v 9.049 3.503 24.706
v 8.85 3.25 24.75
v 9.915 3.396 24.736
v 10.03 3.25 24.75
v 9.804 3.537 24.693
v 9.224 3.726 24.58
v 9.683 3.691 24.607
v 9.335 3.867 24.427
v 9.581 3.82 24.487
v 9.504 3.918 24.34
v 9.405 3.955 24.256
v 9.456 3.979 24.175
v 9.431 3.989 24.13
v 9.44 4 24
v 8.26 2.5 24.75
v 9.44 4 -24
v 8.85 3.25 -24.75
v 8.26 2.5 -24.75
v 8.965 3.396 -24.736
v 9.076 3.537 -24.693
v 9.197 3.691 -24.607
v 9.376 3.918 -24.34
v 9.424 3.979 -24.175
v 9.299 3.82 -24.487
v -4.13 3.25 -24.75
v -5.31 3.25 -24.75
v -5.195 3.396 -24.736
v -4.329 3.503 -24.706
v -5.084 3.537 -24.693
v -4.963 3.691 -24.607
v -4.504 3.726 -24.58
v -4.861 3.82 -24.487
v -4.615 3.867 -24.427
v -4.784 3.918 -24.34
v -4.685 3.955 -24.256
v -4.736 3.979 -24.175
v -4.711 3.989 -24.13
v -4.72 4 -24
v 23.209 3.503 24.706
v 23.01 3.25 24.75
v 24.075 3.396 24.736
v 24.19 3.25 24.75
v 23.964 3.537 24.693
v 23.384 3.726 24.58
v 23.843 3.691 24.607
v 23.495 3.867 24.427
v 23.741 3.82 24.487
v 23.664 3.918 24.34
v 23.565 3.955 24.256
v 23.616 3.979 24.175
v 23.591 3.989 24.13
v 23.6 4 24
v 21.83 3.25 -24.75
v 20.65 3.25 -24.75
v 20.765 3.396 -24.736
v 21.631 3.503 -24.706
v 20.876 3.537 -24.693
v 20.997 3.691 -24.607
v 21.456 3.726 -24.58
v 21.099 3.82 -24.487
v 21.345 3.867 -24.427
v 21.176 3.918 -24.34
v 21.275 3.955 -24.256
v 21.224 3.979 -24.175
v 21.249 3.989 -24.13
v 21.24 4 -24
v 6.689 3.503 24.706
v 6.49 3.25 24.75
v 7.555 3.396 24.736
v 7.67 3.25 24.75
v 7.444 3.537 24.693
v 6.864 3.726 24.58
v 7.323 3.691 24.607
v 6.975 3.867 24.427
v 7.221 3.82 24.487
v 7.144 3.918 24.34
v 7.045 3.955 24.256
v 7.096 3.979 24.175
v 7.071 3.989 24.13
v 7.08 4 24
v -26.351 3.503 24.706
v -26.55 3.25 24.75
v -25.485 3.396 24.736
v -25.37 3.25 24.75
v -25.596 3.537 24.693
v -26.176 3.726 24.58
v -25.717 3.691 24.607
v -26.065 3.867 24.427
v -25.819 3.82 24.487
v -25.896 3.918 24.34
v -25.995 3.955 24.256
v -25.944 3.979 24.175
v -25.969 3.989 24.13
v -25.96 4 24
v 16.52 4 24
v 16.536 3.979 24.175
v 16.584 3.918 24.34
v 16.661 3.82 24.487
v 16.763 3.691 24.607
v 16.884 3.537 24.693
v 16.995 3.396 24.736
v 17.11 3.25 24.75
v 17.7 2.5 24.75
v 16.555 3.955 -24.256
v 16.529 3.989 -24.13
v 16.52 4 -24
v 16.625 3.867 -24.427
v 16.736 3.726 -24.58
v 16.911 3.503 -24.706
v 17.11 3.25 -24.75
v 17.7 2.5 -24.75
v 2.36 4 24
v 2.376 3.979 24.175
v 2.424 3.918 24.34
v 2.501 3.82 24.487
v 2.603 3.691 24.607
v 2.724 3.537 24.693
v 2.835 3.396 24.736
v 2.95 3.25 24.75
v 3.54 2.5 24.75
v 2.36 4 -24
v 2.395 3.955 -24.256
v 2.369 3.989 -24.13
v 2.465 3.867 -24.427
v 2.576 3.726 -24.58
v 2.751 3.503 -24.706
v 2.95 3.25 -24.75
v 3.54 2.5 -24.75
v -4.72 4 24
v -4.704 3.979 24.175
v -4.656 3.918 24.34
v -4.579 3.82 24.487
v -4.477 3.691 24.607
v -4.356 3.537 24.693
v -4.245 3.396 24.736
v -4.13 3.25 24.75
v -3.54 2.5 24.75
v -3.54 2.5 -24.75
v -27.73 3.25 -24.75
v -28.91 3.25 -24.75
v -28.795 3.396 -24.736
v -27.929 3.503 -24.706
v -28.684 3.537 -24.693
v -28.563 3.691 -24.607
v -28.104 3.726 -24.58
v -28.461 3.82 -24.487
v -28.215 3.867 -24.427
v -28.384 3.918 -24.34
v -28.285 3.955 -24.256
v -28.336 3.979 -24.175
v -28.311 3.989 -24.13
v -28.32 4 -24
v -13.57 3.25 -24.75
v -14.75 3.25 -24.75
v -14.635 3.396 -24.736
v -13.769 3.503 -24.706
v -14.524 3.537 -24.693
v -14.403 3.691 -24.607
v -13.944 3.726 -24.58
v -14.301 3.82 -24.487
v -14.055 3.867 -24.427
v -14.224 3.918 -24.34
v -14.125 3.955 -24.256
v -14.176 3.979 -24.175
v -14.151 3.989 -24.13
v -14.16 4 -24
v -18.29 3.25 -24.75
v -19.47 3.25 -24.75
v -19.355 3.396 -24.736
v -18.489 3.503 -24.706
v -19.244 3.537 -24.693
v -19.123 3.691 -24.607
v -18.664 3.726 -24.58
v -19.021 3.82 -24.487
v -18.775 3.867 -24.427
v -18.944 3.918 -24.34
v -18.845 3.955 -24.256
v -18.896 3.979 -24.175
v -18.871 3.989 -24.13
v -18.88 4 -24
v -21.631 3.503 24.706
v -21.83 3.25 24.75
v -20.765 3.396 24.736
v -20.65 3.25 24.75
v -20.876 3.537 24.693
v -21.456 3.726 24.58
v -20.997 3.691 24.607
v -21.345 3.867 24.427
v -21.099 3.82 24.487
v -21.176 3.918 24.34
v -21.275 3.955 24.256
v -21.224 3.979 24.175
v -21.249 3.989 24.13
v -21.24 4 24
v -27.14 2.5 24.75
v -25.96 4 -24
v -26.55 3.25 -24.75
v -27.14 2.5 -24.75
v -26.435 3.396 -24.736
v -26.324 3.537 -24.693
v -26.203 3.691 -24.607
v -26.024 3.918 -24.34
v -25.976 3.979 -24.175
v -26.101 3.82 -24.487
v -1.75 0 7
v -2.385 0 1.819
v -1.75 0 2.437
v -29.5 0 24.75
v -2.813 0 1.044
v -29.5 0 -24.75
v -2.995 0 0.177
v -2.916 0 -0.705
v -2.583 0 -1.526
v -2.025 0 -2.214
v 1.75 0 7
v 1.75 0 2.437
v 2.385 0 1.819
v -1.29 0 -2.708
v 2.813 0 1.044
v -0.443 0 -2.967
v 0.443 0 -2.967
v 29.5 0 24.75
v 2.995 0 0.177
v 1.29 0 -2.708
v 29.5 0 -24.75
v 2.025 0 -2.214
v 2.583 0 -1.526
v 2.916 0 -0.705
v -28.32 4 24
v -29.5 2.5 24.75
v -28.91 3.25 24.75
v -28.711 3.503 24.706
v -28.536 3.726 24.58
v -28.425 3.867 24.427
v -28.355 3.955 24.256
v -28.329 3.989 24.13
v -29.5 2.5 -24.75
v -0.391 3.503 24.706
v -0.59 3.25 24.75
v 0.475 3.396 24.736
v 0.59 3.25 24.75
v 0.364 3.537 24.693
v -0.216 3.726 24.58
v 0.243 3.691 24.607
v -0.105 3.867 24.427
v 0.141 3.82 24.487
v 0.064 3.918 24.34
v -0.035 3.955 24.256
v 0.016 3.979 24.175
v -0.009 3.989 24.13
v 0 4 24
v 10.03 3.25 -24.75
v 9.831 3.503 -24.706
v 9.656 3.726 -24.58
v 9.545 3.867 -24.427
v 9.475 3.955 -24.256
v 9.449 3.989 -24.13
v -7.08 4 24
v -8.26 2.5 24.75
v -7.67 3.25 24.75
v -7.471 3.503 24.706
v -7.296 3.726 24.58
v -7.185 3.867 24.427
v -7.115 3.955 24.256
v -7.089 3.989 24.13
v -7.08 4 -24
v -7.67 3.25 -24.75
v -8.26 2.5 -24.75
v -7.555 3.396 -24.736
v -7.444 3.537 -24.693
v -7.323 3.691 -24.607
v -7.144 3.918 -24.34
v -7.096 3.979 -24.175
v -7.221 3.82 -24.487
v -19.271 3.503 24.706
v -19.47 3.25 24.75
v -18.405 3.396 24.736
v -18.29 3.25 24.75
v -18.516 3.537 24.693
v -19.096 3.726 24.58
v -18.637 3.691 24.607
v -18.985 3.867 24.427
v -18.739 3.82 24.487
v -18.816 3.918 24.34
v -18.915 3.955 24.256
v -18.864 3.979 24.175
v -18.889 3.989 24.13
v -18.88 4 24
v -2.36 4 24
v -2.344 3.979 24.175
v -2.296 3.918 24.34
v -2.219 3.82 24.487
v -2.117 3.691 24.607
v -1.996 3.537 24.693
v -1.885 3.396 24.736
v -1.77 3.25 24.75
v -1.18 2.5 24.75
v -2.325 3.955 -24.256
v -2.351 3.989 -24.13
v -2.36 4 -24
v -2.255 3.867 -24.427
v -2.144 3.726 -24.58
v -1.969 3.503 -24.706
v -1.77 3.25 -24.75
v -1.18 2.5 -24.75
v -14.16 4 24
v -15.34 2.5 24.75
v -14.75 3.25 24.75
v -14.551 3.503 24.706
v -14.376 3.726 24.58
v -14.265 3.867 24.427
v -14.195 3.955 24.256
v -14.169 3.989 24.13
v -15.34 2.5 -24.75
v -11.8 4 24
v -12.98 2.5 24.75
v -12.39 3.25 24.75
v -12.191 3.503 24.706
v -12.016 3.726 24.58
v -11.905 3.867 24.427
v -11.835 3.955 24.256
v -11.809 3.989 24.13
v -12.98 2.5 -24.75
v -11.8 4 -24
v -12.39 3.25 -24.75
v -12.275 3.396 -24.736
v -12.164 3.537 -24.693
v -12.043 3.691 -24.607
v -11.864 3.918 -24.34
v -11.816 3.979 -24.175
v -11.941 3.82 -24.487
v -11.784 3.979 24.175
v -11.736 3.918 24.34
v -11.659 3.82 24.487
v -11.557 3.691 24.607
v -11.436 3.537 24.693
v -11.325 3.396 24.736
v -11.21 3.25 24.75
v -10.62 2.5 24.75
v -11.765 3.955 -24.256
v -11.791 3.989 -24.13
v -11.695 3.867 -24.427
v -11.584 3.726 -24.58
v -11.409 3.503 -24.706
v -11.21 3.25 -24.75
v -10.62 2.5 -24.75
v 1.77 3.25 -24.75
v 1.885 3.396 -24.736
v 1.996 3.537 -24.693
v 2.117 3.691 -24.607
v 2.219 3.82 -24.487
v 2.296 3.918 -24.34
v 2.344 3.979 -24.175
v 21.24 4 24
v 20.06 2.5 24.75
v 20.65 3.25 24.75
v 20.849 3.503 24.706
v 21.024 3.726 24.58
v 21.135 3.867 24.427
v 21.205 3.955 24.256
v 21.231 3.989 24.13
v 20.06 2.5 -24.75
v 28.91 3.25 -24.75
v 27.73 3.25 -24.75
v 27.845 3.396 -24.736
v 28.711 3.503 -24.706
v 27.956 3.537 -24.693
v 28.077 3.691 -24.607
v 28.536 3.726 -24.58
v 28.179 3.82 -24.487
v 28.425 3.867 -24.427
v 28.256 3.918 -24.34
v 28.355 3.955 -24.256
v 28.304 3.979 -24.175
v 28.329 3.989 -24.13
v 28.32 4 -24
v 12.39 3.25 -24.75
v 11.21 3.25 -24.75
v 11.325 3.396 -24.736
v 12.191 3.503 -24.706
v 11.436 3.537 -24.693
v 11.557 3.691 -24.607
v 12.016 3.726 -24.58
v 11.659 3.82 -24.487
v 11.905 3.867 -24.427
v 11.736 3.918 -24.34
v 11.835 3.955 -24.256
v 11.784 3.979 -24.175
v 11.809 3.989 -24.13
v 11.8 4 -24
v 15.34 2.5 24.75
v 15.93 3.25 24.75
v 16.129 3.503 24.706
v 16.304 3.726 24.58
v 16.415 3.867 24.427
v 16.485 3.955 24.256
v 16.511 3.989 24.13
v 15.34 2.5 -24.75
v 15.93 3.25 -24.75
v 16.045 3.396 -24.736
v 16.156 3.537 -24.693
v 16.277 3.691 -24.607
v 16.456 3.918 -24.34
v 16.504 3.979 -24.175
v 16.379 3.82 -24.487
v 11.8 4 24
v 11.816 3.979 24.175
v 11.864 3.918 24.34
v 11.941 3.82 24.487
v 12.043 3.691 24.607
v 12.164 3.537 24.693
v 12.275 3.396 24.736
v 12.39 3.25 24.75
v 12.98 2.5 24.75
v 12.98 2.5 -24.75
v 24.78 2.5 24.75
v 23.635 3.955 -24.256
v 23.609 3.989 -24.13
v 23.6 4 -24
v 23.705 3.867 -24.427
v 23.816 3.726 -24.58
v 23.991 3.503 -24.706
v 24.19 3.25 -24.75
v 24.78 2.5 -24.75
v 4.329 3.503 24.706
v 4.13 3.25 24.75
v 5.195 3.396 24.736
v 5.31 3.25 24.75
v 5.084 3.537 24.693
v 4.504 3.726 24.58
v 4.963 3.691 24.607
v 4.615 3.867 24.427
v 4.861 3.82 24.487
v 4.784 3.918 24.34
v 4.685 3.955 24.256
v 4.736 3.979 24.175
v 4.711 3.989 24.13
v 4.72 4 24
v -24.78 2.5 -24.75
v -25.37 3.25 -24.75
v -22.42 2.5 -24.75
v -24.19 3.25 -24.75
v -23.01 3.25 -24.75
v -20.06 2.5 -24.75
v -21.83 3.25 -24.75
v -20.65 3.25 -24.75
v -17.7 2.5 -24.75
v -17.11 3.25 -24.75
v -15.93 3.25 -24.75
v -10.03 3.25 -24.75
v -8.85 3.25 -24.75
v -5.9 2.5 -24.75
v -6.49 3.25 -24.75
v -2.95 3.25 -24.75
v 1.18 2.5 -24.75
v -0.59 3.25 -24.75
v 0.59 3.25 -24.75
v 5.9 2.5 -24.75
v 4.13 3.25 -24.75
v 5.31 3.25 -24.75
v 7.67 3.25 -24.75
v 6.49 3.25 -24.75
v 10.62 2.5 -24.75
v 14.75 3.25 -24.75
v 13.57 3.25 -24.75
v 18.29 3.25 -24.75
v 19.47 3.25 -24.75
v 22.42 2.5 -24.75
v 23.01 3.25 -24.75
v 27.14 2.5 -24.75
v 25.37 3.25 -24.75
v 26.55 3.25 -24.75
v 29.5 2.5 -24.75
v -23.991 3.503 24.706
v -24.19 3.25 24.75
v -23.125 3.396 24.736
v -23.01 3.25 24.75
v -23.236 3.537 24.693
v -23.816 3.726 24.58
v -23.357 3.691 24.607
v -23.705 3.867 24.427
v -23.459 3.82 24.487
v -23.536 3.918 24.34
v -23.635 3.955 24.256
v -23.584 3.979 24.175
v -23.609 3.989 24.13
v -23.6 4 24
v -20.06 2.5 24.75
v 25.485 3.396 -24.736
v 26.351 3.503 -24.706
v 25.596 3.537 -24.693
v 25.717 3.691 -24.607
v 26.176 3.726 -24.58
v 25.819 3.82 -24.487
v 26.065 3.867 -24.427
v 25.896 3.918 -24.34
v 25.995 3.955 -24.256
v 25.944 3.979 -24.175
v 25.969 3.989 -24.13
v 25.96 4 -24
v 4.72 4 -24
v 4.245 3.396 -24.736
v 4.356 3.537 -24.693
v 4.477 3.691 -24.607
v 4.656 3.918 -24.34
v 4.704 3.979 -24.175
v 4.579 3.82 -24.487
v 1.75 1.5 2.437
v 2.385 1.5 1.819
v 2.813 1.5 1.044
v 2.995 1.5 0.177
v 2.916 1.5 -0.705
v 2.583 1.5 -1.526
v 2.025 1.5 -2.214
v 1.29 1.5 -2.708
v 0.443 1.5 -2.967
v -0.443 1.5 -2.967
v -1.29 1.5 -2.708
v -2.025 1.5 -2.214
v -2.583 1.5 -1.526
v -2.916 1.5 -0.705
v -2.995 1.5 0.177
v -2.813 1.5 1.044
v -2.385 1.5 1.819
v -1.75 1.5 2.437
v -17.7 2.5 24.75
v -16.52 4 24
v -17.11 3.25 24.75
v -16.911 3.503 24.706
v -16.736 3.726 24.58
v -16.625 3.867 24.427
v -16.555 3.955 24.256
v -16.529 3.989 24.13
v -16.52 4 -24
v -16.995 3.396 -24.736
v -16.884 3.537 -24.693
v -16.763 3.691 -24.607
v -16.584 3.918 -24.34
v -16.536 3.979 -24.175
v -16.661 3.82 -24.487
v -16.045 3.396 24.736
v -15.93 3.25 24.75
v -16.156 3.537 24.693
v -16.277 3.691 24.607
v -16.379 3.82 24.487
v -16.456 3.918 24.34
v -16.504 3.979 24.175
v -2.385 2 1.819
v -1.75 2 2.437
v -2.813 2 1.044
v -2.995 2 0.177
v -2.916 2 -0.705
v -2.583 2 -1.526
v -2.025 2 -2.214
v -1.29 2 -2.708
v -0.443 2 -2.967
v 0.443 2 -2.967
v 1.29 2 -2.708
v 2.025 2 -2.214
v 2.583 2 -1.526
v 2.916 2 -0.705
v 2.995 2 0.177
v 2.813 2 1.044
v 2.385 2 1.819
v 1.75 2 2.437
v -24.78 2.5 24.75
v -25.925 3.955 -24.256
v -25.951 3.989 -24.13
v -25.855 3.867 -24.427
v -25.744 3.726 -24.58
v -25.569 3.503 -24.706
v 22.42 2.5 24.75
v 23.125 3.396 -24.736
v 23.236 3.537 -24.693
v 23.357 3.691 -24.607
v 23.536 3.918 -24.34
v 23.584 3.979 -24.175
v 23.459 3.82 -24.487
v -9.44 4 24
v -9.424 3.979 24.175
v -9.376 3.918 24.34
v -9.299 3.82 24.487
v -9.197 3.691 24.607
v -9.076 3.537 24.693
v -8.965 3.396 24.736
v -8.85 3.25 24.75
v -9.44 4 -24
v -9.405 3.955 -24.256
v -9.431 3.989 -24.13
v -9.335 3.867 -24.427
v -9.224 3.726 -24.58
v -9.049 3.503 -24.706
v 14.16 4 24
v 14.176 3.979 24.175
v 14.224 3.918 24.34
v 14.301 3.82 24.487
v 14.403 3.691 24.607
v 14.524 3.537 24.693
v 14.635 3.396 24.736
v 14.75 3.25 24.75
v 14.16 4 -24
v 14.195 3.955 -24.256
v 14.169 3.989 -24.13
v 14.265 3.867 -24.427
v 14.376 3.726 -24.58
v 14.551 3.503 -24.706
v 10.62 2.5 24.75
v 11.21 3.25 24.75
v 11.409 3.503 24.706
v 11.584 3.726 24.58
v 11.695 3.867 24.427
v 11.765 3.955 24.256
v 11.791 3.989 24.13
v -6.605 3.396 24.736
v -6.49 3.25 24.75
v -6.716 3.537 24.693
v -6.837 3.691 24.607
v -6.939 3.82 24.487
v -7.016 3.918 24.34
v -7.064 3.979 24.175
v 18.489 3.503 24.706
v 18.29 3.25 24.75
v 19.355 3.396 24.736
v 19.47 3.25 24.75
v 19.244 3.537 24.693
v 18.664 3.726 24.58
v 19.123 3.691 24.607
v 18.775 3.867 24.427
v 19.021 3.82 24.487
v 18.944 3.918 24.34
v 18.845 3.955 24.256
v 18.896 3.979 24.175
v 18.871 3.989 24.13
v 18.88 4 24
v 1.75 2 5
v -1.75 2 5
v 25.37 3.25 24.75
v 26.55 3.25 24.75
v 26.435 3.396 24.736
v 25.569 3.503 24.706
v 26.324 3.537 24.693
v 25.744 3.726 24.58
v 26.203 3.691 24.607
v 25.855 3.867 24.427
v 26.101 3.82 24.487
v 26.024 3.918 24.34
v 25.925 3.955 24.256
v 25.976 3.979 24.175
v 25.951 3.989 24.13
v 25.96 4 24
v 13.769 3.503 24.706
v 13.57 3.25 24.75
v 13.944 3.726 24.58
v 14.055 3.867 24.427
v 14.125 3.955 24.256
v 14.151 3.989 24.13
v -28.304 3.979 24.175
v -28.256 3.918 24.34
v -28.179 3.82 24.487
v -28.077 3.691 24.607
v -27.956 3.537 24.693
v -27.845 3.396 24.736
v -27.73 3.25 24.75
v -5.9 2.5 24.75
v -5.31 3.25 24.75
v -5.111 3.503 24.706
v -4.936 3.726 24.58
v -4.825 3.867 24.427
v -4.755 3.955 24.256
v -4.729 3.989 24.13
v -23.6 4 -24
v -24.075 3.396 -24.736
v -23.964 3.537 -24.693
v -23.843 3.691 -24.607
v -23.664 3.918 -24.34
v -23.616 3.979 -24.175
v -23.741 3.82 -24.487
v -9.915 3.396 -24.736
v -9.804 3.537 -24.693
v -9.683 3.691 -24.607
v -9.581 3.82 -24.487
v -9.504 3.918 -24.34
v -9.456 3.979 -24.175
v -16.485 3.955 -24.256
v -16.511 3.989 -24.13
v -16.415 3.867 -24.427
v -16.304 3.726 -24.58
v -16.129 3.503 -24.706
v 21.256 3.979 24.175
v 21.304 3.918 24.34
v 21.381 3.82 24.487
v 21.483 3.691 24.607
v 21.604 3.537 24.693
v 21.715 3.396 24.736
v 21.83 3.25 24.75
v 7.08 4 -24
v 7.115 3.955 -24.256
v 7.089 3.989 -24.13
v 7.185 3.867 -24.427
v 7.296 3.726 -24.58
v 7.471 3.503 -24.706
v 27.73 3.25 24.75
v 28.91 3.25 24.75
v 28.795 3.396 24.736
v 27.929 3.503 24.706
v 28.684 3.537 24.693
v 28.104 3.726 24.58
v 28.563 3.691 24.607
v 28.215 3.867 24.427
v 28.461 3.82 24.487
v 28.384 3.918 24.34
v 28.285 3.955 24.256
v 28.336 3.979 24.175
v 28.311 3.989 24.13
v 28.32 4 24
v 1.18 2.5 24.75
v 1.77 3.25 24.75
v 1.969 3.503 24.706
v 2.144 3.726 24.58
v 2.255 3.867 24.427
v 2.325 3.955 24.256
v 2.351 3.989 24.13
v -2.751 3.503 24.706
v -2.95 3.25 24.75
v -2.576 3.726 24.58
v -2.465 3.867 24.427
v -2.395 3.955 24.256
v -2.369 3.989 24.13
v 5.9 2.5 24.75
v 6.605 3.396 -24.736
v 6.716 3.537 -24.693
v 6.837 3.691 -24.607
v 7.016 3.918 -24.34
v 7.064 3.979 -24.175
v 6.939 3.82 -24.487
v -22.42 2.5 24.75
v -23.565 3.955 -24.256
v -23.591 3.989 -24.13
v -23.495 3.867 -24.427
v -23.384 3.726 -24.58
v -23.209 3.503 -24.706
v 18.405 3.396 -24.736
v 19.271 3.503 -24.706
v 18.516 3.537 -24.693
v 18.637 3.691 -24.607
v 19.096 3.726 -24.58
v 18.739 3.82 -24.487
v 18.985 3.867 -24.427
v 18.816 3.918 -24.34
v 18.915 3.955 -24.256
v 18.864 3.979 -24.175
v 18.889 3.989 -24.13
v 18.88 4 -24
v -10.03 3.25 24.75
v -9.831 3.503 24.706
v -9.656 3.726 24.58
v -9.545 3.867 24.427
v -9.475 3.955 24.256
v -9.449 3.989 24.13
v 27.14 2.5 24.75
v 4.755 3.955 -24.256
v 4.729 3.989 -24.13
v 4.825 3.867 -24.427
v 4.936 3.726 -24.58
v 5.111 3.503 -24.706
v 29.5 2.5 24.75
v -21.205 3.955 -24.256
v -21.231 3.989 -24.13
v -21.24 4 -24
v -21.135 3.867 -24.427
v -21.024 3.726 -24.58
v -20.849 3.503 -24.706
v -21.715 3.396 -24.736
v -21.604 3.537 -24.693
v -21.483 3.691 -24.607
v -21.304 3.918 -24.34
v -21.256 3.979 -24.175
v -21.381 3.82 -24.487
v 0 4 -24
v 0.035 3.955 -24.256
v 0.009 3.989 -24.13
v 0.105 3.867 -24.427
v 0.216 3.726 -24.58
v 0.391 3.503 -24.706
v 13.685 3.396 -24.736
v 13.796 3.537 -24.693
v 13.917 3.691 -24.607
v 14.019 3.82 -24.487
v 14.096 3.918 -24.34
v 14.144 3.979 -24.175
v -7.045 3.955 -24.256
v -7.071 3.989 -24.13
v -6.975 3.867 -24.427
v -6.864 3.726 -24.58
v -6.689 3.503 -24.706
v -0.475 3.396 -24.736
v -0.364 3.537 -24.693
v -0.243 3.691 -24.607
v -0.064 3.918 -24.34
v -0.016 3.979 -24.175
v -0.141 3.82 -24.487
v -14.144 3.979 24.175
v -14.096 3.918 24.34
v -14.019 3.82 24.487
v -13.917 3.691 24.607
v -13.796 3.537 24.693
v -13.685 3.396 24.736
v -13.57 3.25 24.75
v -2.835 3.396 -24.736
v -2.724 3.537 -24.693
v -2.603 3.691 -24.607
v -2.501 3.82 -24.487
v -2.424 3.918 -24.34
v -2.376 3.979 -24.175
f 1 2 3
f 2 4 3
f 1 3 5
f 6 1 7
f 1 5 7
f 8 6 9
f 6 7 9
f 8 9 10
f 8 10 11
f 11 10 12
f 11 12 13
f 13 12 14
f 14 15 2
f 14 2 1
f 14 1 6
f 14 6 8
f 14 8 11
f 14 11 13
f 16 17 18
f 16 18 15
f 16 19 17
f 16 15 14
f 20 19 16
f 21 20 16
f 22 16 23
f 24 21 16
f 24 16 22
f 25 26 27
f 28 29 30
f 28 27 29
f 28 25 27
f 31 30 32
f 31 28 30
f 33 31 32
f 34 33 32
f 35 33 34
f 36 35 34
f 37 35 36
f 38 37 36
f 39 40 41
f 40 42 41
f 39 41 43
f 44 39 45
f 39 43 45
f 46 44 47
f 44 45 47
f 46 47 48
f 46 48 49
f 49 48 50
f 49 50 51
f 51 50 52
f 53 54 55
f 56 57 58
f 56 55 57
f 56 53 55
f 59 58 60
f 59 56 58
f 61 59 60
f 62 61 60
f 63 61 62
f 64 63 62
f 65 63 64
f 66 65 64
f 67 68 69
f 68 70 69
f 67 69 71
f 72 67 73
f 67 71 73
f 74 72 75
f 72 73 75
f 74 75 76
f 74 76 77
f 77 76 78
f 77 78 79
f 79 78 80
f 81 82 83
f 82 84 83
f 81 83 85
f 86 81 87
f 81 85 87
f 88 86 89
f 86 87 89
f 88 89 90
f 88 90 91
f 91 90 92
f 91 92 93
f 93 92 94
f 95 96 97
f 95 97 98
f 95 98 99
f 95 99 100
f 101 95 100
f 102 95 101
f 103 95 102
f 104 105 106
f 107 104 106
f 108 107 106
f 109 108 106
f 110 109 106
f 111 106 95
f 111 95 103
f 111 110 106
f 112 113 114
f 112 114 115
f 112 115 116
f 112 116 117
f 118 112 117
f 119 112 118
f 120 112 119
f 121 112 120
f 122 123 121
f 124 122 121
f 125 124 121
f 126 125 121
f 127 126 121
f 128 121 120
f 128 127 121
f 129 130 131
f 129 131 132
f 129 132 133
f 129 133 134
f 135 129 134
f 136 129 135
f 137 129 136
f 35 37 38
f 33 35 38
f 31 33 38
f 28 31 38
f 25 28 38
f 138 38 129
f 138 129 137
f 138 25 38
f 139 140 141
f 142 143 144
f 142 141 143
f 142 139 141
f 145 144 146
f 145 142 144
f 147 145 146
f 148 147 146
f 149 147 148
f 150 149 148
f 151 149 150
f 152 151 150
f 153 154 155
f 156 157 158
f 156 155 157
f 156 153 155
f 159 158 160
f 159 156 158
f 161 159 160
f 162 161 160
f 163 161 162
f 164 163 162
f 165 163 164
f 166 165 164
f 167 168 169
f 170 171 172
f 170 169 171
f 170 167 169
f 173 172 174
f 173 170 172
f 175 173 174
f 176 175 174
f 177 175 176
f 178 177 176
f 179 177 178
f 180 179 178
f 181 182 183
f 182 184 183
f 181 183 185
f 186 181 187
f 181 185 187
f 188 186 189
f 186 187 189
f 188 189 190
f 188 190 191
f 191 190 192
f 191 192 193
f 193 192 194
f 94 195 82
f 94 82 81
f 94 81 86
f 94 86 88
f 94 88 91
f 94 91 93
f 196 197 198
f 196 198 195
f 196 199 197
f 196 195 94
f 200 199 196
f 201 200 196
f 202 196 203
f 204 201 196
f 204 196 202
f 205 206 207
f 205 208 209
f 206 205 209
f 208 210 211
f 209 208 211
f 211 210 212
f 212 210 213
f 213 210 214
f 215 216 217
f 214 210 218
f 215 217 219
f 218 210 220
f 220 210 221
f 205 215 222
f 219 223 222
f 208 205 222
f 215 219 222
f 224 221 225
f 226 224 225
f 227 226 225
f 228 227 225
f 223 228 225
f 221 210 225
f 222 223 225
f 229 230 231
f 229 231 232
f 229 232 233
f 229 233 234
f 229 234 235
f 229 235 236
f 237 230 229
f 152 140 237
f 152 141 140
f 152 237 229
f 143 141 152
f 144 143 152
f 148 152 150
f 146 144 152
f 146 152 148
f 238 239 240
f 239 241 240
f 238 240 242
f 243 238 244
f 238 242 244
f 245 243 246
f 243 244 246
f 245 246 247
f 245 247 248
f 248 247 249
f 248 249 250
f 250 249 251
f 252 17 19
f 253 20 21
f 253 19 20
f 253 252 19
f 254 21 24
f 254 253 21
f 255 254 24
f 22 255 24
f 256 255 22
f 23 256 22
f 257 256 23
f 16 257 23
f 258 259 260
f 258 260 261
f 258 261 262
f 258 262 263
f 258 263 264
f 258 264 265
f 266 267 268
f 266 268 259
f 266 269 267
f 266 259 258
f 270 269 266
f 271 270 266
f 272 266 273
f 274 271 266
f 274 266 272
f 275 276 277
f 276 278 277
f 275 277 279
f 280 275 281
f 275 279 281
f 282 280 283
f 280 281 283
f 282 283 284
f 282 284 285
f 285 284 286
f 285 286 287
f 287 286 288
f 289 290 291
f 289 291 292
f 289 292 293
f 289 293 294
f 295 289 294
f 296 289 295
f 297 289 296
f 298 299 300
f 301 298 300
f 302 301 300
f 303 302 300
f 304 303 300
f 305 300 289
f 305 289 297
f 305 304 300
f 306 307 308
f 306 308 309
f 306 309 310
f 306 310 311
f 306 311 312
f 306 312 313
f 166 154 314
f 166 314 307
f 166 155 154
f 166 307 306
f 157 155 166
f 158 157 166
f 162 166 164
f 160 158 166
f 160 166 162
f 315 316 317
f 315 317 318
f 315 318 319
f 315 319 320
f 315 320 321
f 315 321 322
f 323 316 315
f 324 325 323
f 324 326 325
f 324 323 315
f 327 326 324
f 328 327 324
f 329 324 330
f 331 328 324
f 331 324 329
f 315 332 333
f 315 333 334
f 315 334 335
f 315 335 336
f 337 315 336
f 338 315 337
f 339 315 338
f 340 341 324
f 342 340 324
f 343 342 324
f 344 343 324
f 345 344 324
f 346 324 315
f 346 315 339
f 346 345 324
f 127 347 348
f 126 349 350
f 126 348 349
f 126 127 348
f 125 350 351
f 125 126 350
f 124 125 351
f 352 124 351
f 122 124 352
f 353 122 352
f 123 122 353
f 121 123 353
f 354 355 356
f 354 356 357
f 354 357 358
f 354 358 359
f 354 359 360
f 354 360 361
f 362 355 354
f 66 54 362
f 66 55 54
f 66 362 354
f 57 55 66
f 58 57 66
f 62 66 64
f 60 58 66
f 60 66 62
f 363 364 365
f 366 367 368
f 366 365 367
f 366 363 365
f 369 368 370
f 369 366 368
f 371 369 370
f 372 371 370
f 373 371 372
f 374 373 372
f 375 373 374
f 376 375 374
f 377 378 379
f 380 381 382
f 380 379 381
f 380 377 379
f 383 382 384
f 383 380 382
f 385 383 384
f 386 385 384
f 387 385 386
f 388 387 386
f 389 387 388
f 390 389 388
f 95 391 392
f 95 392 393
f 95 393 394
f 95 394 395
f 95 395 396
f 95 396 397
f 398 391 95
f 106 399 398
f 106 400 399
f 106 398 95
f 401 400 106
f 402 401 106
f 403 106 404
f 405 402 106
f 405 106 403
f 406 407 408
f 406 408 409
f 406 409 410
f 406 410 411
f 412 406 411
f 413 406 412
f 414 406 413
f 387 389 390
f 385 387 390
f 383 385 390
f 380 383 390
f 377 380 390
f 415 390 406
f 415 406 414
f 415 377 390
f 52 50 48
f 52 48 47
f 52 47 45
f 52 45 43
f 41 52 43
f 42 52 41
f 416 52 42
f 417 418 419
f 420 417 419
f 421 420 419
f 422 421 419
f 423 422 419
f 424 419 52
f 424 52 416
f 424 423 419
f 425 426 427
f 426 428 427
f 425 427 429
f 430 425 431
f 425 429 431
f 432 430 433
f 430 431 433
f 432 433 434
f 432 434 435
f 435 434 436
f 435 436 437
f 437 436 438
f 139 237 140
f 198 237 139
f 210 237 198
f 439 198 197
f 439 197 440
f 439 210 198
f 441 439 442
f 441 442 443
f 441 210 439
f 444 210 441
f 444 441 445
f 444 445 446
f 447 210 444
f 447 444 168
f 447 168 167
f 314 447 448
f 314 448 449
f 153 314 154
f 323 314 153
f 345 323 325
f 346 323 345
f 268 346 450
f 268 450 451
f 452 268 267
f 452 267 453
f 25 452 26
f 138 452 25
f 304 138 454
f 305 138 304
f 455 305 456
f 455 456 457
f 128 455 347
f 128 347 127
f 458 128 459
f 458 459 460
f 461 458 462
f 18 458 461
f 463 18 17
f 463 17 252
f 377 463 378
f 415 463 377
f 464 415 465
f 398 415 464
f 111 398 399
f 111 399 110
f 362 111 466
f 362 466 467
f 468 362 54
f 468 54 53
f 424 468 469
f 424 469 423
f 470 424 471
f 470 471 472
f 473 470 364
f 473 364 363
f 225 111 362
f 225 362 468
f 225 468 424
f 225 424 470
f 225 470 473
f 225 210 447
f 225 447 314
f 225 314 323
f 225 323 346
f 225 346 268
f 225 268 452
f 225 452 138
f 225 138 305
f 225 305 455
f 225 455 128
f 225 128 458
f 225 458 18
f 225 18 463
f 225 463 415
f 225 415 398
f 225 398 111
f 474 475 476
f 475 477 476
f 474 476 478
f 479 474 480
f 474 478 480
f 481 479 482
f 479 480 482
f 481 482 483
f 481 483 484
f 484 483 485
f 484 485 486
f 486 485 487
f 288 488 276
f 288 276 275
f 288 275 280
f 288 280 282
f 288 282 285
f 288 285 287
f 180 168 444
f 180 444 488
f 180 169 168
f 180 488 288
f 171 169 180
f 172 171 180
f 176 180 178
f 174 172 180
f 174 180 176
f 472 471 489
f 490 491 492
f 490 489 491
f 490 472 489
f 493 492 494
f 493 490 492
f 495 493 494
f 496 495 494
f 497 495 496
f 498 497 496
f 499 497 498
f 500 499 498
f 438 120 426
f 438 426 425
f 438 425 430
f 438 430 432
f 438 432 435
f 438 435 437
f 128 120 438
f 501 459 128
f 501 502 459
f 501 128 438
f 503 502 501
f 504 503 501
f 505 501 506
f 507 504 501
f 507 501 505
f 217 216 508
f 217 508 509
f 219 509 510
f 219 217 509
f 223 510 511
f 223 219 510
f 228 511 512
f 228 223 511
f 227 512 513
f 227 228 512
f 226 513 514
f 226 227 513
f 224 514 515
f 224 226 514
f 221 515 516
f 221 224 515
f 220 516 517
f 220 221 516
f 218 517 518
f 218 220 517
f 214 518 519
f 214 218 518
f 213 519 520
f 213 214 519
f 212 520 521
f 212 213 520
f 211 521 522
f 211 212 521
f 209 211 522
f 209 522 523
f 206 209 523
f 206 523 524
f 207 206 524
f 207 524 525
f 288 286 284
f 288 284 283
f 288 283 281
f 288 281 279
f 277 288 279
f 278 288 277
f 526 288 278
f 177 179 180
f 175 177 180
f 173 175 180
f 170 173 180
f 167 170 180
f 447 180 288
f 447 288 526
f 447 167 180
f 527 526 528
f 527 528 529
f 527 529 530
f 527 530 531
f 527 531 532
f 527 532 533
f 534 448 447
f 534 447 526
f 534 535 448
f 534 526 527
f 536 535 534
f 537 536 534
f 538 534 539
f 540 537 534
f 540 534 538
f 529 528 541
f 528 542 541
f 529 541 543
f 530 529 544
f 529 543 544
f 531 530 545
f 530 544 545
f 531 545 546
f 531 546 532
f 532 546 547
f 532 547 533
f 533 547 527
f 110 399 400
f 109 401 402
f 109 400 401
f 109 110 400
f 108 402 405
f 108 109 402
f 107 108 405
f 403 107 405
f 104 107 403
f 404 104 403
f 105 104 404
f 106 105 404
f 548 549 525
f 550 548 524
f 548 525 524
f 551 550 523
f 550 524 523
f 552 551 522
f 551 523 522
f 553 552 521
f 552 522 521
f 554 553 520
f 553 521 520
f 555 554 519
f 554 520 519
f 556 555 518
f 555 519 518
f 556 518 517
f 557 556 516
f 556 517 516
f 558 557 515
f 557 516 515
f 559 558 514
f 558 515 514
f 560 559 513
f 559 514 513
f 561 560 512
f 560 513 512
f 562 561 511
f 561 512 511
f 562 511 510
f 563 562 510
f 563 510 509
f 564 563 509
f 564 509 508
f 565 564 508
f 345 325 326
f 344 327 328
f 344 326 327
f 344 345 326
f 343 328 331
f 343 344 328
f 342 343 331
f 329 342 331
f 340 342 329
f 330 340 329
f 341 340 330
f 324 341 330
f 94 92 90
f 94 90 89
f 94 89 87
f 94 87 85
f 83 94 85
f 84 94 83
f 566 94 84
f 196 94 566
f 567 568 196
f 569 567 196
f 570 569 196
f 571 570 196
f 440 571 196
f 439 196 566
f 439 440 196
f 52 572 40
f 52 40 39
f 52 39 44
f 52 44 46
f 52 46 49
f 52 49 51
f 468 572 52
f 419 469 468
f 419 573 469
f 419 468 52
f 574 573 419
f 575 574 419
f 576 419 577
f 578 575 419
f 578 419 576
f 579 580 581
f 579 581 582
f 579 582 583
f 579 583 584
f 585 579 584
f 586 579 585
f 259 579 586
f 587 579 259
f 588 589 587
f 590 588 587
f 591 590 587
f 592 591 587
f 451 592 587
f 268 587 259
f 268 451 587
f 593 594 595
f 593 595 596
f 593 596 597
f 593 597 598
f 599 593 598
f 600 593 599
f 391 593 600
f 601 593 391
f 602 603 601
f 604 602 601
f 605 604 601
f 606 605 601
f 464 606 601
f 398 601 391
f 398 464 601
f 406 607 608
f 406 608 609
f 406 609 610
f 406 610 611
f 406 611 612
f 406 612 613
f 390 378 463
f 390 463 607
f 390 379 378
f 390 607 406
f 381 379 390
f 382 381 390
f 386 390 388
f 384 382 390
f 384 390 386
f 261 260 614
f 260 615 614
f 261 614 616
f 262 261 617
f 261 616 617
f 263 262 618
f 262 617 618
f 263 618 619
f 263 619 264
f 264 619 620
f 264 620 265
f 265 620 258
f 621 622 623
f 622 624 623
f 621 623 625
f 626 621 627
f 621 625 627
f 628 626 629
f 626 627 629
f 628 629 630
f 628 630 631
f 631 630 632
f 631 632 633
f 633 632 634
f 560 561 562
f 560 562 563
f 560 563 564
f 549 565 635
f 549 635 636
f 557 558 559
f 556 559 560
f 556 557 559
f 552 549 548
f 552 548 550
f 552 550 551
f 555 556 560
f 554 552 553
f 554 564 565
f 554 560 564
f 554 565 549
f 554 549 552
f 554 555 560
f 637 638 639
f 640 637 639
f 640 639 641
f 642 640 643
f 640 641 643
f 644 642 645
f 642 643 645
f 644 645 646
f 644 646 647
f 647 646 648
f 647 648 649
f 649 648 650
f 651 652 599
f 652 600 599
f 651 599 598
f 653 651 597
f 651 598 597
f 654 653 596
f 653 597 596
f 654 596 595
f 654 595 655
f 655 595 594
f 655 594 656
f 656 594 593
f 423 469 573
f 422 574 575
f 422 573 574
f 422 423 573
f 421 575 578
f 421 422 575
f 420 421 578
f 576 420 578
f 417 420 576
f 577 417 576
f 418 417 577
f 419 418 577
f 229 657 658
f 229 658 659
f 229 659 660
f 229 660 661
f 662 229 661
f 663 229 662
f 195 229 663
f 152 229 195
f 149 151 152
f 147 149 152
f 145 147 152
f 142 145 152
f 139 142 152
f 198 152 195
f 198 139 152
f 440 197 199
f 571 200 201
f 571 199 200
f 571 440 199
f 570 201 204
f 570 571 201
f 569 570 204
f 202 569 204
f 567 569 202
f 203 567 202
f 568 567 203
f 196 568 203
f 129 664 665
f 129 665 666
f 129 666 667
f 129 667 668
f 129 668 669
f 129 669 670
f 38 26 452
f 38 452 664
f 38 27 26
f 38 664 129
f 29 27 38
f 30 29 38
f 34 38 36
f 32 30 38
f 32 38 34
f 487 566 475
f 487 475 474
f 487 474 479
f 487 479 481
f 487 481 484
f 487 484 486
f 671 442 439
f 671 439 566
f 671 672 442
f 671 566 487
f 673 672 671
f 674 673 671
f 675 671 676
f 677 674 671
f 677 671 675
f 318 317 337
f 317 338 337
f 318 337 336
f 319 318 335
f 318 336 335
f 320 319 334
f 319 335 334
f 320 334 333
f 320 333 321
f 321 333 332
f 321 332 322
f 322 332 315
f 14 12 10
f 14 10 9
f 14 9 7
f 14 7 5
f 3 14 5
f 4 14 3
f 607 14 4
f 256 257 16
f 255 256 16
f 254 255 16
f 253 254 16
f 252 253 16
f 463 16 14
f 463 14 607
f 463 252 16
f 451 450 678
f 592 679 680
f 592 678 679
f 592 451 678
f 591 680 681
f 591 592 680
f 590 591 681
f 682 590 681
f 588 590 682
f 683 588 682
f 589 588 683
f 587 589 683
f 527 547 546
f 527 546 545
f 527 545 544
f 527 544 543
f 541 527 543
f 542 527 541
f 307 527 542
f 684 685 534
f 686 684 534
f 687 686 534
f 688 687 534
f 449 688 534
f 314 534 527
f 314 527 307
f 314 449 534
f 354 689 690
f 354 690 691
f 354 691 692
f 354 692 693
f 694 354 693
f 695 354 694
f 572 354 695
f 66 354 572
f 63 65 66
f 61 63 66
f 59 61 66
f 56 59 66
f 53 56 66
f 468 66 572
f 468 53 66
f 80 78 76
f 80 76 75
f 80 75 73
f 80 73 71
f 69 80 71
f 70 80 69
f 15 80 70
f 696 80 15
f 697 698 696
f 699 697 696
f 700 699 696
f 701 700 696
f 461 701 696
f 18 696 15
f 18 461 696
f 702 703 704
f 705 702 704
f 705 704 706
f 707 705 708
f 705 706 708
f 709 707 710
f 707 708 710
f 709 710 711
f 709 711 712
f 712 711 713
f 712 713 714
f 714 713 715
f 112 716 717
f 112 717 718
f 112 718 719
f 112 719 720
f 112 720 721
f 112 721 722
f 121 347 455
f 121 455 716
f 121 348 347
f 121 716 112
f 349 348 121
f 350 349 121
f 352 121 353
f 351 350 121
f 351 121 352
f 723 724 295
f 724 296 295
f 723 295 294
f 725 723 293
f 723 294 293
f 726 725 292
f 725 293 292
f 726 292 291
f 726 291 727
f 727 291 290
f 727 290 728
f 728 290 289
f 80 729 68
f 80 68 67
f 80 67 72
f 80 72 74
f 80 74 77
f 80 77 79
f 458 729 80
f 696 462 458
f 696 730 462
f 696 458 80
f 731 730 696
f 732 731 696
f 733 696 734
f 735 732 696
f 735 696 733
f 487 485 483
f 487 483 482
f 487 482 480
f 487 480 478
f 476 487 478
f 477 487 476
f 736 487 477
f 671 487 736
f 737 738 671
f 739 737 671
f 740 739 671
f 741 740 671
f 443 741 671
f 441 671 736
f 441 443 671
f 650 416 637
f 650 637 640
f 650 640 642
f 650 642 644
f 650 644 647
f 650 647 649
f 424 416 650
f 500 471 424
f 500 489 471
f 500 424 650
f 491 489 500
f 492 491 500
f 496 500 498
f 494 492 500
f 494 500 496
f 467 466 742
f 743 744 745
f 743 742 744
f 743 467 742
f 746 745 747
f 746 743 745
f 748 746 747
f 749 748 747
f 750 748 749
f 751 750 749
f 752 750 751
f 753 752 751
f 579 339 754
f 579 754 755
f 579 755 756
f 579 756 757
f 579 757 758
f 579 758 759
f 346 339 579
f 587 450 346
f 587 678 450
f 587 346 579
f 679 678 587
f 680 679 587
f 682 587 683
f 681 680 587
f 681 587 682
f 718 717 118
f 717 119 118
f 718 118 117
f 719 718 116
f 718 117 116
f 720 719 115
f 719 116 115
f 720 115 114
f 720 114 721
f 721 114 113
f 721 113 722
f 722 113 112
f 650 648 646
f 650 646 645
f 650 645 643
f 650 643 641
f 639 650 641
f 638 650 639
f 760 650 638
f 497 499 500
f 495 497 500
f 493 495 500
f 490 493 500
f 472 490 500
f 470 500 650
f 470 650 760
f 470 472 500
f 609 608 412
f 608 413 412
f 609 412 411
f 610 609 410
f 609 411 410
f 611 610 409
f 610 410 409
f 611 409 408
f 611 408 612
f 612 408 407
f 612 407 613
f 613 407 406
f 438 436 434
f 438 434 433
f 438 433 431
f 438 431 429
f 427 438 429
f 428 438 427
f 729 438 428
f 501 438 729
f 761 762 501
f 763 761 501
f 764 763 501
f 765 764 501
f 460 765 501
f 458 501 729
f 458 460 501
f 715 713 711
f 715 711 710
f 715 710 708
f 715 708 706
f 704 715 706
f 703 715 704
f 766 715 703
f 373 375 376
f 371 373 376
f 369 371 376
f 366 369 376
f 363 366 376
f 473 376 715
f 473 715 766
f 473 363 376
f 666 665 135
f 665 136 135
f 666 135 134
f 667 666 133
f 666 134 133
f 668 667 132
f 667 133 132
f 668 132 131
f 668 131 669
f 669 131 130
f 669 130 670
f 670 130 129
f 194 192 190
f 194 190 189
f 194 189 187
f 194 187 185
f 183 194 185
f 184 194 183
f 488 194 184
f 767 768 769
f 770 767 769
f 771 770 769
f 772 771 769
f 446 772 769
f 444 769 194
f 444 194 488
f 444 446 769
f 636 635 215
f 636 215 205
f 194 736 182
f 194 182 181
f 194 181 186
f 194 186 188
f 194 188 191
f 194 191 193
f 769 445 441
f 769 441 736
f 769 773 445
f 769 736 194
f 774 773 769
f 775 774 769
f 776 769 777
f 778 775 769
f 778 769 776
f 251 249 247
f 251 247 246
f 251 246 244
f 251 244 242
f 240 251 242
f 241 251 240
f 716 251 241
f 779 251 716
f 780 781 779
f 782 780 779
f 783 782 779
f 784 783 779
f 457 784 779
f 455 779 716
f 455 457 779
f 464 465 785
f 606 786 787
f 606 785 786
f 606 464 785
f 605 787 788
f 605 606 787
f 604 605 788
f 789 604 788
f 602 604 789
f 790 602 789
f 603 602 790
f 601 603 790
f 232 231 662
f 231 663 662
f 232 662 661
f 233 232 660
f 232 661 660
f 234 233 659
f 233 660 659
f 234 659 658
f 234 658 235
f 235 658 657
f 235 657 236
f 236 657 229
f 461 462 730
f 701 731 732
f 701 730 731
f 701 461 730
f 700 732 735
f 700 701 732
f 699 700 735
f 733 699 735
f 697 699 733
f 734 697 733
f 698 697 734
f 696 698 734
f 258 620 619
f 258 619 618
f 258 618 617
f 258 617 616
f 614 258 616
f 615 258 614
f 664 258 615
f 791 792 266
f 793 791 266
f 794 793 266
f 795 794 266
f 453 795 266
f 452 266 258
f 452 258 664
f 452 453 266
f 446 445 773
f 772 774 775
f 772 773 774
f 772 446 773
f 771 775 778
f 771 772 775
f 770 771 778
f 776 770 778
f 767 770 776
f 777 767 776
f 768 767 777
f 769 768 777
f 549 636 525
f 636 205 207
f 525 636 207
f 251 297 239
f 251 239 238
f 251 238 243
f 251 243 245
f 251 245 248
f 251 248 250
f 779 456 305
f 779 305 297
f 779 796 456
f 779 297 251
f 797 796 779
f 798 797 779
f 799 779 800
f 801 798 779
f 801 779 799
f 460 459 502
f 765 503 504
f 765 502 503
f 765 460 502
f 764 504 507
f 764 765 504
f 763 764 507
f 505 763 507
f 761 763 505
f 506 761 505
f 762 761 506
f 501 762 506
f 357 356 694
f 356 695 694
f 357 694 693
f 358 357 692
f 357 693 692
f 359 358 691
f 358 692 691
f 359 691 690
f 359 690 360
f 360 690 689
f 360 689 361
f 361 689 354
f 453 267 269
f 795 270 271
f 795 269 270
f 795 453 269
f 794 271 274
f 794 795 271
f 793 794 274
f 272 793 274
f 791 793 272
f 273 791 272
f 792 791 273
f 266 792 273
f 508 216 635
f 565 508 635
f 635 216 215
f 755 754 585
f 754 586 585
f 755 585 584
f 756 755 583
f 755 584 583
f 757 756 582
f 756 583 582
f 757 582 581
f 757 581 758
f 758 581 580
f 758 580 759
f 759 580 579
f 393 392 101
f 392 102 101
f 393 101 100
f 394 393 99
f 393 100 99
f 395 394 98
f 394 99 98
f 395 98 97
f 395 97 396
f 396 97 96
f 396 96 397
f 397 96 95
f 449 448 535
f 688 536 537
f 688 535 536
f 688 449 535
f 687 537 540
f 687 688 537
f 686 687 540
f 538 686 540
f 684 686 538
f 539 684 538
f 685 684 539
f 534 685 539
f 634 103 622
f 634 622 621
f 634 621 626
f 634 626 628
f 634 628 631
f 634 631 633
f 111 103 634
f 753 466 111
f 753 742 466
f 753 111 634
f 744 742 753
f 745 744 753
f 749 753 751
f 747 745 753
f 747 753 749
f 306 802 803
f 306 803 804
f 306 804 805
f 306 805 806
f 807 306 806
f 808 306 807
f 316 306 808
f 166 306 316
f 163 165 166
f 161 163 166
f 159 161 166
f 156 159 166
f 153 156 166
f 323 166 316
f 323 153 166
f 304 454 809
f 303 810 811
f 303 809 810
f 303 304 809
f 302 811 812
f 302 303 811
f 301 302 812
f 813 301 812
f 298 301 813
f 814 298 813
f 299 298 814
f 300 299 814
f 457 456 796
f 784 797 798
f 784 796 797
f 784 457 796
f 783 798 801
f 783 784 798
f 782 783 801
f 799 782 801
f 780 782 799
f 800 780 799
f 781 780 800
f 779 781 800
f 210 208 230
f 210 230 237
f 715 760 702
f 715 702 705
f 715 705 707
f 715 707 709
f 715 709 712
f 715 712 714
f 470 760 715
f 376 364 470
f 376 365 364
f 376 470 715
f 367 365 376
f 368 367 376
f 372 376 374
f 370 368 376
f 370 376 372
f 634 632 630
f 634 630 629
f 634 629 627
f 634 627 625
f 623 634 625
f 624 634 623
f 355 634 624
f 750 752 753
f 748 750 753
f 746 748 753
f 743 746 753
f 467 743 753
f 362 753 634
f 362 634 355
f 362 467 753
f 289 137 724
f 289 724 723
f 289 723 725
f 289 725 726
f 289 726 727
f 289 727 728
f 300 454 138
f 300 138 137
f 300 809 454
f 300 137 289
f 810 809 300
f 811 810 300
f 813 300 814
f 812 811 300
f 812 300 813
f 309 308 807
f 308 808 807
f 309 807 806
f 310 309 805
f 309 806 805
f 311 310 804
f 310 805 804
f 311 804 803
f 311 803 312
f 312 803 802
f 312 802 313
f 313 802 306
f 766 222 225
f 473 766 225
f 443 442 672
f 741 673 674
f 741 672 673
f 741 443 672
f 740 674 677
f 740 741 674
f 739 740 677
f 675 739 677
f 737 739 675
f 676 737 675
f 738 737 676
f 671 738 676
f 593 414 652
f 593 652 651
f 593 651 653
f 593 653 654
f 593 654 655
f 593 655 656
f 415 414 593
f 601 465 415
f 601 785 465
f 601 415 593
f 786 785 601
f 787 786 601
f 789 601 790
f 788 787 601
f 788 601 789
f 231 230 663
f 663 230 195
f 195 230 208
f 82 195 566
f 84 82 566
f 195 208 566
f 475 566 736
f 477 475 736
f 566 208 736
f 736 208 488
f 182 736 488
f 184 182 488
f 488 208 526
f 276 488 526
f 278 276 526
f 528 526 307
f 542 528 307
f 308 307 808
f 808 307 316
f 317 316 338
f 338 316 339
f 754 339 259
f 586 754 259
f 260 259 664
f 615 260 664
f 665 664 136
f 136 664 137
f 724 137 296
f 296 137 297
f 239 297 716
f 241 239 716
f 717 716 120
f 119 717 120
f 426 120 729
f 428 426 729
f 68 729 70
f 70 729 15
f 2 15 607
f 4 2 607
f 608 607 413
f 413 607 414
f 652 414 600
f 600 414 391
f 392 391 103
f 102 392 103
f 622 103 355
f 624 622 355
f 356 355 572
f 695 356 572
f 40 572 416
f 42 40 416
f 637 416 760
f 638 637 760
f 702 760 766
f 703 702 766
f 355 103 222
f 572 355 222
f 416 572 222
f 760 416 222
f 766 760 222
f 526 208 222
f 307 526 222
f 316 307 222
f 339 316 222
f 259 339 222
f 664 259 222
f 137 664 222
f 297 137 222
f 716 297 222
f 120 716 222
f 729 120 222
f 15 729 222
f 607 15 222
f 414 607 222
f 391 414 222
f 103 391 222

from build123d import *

# Parameters (mm, degrees)
SKETCH1_W           = 59
SKETCH1_H           = 49.5
SKETCH1_R           = 3
BOSS_EXTRUDE1_DEPTH = 1.5
BOSS_EXTRUDE2_DEPTH = 49.5
CUT_EXTRUDE1_DEPTH  = 2
CUT_EXTRUDE3_DEPTH  = 65.105869466
CHAMFER3_SIZE       = 2


with BuildPart() as part:
    # Sketch1 → Boss-Extrude1 (new body)
    with BuildSketch(Plane(origin=(0, 0, 0), x_dir=(1, 0, 0), z_dir=(0, 1, 0))):
        Rectangle(SKETCH1_W, SKETCH1_H)
        with Locations(Location((0, 0, 0), (0, 0, 270))):
            Circle(SKETCH1_R, mode=Mode.SUBTRACT)
    extrude(amount=BOSS_EXTRUDE1_DEPTH)

    # Sketch2 → Boss-Extrude2 (add)
    with BuildSketch(Plane(origin=(0, 0, -24.75), x_dir=(-1, 0, 0), z_dir=(0, 0, -1))):
        Polygon((-29.5, 1.5), (29.5, 1.5), (29.5, 2.5), (28.32, 4), (27.14, 2.5), (25.96, 4), (24.78, 2.5), (23.6, 4), (22.42, 2.5), (21.24, 4), (20.06, 2.5), (18.88, 4), (17.7, 2.5), (16.52, 4), (15.34, 2.5), (14.16, 4), (12.98, 2.5), (11.8, 4), (10.62, 2.5), (9.44, 4), (8.26, 2.5), (7.08, 4), (5.9, 2.5), (4.72, 4), (3.54, 2.5), (2.36, 4), (1.18, 2.5), (0, 4), (-1.18, 2.5), (-2.36, 4), (-3.54, 2.5), (-4.72, 4), (-5.9, 2.5), (-7.08, 4), (-8.26, 2.5), (-9.44, 4), (-10.62, 2.5), (-11.8, 4), (-12.98, 2.5), (-14.16, 4), (-15.34, 2.5), (-16.52, 4), (-17.7, 2.5), (-18.88, 4), (-20.06, 2.5), (-21.24, 4), (-22.42, 2.5), (-23.6, 4), (-24.78, 2.5), (-25.96, 4), (-27.14, 2.5), (-28.32, 4), (-29.5, 2.5), align=None)
    extrude(amount=-BOSS_EXTRUDE2_DEPTH)

    # Sketch3 → Cut-Extrude1 (cut)
    with BuildSketch(Plane(origin=(0, 0, 0), x_dir=(-1, 0, 0), z_dir=(0, -1, 0))):
        with BuildLine():
            Line((-1.75, -2.436698586), (-1.75, -5))
            Line((-1.75, -5), (1.75, -5))
            Line((1.75, -5), (1.75, -2.436698586))
            ThreePointArc((1.75, -2.436698586), (0, 3), (-1.75, -2.436698586))
        make_face()
    extrude(amount=-CUT_EXTRUDE1_DEPTH, mode=Mode.SUBTRACT)

    # Sketch4 → Cut-Extrude3 (cut, through all)
    with BuildSketch(Plane(origin=(29.5, 0, 0), x_dir=(0, 0, -1), z_dir=(1, 0, 0))):
        with BuildLine():
            Line((-24, 4), (-24.75, 4))
            Line((-24.75, 4), (-24.75, 3.25))
            ThreePointArc((-24.75, 3.25), (-24.530330086, 3.780330086), (-24, 4))
        make_face()
    cut_extrude3 = extrude(amount=-CUT_EXTRUDE3_DEPTH, mode=Mode.SUBTRACT)

    # Mirror1: Cut-Extrude3 across plane
    add(cut_extrude3.mirror(Plane.XY), mode=Mode.SUBTRACT)

    # Chamfer3
    chamfer3_edges = [part.edges().sort_by_distance(p)[0] for p in [
        (0, 0, 5),
    ]]
    chamfer(chamfer3_edges, length=CHAMFER3_SIZE - 0.0001)  # a hair under: the kernel refuses the full size


solid = part.part
